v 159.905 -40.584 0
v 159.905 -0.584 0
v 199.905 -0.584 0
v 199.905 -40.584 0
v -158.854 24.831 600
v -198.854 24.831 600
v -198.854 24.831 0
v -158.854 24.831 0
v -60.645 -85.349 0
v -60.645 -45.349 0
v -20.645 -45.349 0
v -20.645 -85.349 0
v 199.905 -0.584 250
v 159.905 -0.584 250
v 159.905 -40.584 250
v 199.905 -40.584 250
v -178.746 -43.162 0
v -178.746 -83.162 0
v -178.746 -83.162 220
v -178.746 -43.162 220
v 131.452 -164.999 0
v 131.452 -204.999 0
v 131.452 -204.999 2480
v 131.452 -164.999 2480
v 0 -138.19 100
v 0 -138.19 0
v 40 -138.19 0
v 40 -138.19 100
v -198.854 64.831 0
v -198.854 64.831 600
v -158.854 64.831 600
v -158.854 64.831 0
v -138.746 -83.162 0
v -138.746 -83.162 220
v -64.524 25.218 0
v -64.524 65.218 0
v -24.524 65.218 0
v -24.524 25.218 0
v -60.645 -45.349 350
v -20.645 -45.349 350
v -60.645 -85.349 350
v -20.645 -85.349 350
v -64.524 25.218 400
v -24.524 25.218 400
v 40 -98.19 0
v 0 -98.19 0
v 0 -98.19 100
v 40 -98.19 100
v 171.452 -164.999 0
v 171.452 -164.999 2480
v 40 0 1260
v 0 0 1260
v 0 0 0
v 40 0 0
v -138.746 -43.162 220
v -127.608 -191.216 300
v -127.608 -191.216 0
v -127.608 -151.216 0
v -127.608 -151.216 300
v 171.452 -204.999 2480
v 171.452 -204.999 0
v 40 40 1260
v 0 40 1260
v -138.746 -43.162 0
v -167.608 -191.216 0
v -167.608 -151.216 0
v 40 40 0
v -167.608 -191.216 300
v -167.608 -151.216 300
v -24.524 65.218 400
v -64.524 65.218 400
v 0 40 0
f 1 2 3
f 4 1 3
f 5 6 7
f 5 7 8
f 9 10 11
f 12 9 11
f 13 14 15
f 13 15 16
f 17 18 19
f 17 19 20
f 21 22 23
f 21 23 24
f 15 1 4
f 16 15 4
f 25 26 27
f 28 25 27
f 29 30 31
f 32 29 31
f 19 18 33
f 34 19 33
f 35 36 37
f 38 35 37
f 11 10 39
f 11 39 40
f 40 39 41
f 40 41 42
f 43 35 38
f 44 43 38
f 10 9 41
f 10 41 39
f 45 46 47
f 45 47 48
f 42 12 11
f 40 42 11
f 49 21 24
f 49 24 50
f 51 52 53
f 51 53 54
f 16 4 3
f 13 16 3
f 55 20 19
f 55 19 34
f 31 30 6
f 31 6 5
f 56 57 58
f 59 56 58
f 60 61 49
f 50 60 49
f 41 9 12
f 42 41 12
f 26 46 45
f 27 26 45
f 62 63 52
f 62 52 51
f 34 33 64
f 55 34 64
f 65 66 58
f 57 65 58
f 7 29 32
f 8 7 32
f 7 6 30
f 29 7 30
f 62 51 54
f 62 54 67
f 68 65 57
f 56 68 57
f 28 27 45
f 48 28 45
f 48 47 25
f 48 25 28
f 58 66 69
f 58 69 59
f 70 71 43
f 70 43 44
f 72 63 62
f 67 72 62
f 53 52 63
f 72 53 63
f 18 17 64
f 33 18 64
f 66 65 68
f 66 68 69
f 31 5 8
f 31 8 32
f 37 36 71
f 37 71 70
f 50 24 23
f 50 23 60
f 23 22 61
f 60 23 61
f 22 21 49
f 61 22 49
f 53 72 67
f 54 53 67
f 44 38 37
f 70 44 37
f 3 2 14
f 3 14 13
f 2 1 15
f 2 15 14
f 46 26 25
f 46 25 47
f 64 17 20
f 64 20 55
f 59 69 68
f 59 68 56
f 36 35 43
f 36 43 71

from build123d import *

# Parameters (mm, degrees)
F0_W      = 40
F0_H      = 40
F1_DEPTH  = 1260
F2_W      = 40
F2_H      = 40
F3_DEPTH  = 220
F4_W      = 40
F4_H      = 40
F5_DEPTH  = 250
F6_W      = 40
F6_H      = 40
F7_DEPTH  = 300
F8_W      = 40
F8_H      = 40
F9_DEPTH  = 2480
F10_W     = 40
F10_H     = 40
F11_DEPTH = 600
F12_W     = 40
F12_H     = 40
F13_DEPTH = 400
F14_W     = 40
F14_H     = 40
F15_DEPTH = 100
F16_W     = 40
F16_H     = 40
F17_DEPTH = 350


with BuildPart() as f1:
    # F0 (on Top) → F1 (new body)
    with BuildSketch(Plane.XY):
        with Locations((20, 20)):
            Rectangle(F0_W, F0_H)
    extrude(amount=F1_DEPTH)


with BuildPart() as f3:
    # F2 (on Top) → F3 (new body)
    with BuildSketch(Plane.XY):
        with Locations((-158.745844, -63.162114)):
            Rectangle(F2_W, F2_H)
    extrude(amount=F3_DEPTH)


with BuildPart() as f5:
    # F4 (on Top) → F5 (new body)
    with BuildSketch(Plane.XY):
        with Locations((179.904881, -20.584031)):
            Rectangle(F4_W, F4_H)
    extrude(amount=F5_DEPTH)


with BuildPart() as f7:
    # F6 (on Top) → F7 (new body)
    with BuildSketch(Plane.XY):
        with Locations((-147.608221, -171.216242)):
            Rectangle(F6_W, F6_H)
    extrude(amount=F7_DEPTH)


with BuildPart() as f9:
    # F8 (on Top) → F9 (new body)
    with BuildSketch(Plane.XY):
        with Locations((151.45169, -184.998773)):
            Rectangle(F8_W, F8_H)
    extrude(amount=F9_DEPTH)


with BuildPart() as f11:
    # F10 (on Top) → F11 (new body)
    with BuildSketch(Plane.XY):
        with Locations((-178.853832, 44.831153)):
            Rectangle(F10_W, F10_H)
    extrude(amount=F11_DEPTH)


with BuildPart() as f13:
    # F12 (on Top) → F13 (new body)
    with BuildSketch(Plane.XY):
        with Locations((-44.524428, 45.218093)):
            Rectangle(F12_W, F12_H)
    extrude(amount=F13_DEPTH)


with BuildPart() as f15:
    # F14 (on Top) → F15 (new body)
    with BuildSketch(Plane.XY):
        with Locations((20, -118.190035)):
            Rectangle(F14_W, F14_H)
    extrude(amount=F15_DEPTH)


with BuildPart() as f17:
    # F16 (on Top) → F17 (new body)
    with BuildSketch(Plane.XY):
        with Locations((-40.644698, -65.348525)):
            Rectangle(F16_W, F16_H)
    extrude(amount=F17_DEPTH)


solid = Compound([f1.part, f3.part, f5.part, f7.part, f9.part, f11.part, f13.part, f15.part, f17.part])
